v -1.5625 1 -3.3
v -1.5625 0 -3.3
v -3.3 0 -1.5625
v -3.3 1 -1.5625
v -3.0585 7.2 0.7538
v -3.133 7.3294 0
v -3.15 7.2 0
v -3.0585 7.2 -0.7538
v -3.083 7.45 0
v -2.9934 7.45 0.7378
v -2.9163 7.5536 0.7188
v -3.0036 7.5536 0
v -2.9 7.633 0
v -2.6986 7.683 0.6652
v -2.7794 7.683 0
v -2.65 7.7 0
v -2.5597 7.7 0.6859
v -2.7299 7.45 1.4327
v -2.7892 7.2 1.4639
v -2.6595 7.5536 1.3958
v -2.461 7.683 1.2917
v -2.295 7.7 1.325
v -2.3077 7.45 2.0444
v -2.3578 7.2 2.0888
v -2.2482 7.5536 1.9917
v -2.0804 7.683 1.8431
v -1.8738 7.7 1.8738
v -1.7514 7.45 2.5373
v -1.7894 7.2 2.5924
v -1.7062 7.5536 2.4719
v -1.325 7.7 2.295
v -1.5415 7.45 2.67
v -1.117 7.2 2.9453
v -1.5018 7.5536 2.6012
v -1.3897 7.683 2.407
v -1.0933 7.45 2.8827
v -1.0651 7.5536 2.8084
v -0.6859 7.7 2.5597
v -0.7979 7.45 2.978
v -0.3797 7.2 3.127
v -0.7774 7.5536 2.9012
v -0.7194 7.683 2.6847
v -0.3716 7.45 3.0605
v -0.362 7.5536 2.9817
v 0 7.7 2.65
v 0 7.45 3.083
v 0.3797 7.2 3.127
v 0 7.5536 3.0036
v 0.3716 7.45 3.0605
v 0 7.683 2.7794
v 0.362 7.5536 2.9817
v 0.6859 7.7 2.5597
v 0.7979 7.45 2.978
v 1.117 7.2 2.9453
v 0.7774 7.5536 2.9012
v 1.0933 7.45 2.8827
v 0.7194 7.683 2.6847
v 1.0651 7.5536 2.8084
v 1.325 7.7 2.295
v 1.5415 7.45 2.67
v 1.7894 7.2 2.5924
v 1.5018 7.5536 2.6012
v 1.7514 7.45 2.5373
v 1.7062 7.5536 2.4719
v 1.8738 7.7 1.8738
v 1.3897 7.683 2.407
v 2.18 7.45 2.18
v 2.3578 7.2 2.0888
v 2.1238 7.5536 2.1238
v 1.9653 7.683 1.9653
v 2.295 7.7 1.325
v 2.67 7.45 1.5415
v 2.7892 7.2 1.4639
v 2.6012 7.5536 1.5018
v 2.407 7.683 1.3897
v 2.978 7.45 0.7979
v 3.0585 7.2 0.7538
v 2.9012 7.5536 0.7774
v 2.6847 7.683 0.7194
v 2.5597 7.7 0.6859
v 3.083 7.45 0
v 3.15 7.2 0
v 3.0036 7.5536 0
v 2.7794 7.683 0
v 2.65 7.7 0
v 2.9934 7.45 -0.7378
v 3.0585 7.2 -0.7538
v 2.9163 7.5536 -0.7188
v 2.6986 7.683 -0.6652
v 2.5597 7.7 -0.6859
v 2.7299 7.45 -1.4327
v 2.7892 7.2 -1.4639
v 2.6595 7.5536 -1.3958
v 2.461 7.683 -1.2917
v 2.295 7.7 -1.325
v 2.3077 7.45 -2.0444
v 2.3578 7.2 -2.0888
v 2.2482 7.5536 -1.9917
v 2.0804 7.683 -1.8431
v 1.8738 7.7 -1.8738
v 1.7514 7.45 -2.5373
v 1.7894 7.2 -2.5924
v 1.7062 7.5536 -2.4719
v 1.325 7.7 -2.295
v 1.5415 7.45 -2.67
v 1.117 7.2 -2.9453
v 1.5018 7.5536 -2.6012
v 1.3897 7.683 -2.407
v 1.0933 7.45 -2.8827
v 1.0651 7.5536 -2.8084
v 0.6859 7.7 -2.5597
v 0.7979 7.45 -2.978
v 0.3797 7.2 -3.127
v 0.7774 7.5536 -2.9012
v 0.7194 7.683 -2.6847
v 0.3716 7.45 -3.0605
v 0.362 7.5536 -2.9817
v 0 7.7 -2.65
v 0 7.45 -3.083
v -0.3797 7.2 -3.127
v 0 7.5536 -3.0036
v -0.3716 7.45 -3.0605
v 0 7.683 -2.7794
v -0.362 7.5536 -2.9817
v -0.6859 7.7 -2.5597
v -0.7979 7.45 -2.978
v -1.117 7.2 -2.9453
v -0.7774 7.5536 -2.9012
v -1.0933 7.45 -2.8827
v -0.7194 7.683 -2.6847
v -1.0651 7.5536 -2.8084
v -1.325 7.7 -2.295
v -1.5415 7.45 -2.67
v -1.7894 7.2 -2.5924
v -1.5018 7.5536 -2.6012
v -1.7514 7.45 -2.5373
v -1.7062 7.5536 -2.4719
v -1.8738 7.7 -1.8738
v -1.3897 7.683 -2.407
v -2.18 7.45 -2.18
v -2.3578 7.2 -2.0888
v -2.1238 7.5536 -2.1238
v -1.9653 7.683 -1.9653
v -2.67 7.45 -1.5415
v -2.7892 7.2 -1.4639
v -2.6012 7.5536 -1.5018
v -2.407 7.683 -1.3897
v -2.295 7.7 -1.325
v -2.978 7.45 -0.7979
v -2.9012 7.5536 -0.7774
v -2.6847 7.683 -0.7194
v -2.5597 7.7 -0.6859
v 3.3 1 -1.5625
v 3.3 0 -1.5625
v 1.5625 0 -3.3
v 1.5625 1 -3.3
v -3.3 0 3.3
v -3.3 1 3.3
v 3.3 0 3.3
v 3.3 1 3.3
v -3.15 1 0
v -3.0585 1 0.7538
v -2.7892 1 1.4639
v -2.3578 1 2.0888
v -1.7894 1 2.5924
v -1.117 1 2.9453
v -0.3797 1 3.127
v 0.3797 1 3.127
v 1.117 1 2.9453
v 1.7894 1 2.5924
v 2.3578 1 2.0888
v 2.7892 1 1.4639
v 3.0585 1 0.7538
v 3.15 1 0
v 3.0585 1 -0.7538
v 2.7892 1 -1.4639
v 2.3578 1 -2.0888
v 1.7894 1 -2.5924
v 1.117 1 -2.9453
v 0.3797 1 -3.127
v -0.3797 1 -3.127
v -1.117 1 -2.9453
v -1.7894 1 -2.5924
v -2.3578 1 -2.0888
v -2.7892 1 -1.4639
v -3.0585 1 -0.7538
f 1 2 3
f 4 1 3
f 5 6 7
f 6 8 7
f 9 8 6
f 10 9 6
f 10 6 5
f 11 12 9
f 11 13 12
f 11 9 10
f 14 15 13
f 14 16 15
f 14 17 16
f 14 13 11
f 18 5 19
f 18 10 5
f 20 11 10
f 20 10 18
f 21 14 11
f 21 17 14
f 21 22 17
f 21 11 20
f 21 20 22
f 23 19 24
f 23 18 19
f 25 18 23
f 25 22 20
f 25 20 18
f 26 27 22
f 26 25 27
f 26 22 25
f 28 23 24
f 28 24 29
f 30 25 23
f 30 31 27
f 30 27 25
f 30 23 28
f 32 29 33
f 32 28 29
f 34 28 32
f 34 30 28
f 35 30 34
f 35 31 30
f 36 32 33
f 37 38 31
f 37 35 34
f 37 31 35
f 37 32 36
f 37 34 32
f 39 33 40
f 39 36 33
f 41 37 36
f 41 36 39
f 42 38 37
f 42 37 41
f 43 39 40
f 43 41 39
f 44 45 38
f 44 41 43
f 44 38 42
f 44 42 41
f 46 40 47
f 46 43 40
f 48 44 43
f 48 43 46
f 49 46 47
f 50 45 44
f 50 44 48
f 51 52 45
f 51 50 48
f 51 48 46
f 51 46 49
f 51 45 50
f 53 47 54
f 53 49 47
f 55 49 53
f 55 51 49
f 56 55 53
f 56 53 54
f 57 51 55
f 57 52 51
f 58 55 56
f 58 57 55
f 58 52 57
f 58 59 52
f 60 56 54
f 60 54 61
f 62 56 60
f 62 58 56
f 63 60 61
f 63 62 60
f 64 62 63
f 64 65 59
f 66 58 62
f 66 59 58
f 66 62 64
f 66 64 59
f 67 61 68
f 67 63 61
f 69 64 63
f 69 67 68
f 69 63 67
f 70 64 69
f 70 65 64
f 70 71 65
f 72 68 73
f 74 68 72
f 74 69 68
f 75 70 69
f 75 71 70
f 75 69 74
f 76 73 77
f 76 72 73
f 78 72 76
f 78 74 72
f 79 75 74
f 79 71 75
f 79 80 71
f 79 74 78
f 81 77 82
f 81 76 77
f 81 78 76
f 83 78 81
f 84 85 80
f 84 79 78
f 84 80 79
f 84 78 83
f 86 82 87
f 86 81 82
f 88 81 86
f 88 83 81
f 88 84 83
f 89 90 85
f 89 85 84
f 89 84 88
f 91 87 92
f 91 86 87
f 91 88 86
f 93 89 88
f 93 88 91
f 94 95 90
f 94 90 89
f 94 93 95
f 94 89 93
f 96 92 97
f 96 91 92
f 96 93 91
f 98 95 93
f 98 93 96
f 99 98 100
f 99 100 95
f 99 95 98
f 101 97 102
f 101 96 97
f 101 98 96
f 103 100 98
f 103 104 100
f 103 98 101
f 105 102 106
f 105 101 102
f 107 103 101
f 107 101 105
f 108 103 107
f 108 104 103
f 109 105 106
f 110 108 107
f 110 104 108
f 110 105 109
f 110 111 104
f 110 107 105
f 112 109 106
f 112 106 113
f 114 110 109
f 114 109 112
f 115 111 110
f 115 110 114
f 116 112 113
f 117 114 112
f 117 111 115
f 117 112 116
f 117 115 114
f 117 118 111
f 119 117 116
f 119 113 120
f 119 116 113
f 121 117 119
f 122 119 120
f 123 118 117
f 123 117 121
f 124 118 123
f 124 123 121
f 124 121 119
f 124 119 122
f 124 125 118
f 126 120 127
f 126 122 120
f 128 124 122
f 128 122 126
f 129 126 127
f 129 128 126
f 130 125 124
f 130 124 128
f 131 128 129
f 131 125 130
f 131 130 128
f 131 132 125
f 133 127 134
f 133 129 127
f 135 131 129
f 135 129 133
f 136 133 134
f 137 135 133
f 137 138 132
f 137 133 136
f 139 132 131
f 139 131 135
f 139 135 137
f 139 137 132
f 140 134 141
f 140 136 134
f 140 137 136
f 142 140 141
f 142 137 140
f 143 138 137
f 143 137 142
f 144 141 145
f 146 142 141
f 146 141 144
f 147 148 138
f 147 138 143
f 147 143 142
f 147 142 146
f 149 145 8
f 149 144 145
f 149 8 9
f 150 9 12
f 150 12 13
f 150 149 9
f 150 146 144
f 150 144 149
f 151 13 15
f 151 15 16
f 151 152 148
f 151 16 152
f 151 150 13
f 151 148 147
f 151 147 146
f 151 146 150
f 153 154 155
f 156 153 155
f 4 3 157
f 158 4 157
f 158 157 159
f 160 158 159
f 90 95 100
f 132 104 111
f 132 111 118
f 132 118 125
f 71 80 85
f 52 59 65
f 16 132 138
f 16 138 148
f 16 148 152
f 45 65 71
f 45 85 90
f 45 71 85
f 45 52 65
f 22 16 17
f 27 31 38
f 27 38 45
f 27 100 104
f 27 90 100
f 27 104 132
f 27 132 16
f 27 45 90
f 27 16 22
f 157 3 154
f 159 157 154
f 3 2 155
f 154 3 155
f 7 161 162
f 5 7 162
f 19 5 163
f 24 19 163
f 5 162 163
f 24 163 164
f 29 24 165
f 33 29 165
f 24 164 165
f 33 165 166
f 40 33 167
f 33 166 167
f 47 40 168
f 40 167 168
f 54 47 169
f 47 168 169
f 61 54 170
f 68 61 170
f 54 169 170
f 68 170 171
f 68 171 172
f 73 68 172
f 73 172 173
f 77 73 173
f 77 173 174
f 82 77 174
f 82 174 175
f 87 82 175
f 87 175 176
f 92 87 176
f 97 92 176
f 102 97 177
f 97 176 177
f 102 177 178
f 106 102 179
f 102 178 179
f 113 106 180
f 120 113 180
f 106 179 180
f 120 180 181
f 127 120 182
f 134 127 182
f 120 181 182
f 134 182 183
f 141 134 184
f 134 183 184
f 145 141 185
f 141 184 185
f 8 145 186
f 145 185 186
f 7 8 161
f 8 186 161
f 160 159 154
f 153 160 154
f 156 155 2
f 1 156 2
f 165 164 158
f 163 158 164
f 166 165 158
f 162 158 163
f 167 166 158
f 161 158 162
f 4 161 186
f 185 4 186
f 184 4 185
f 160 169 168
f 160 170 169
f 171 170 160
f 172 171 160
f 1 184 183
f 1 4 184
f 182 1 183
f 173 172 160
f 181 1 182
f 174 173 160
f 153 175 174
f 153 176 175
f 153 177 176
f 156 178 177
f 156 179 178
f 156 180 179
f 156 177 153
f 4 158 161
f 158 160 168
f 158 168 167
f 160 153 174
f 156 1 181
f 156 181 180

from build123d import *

# Parameters (mm, degrees)
BOSS_EXTRUDE1_DEPTH = 1
SKETCH2_R           = 3.15
BOSS_EXTRUDE2_DEPTH = 6.7
FILLET1_R           = 0.5


with BuildPart() as part:
    # Sketch1 → Boss-Extrude1 (new body)
    with BuildSketch(Plane(origin=(0, 0, 0), x_dir=(1, 0, 0), z_dir=(0, 1, 0))):
        Polygon((-1.562548269, 3.3), (-3.3, 1.562548269), (-3.3, -3.3), (3.3, -3.3), (3.3, 1.562548269), (1.562548269, 3.3), align=None)
    extrude(amount=BOSS_EXTRUDE1_DEPTH)

    # Sketch2 → Boss-Extrude2 (add)
    with BuildSketch(Plane(origin=(0, 1, 0), x_dir=(-1, 0, 0), z_dir=(0, 1, 0))):
        Circle(SKETCH2_R)
    extrude(amount=BOSS_EXTRUDE2_DEPTH)

    # Fillet1
    fillet1_edges = [part.edges().sort_by_distance(p)[0] for p in [
        (3.15, 7.7, 0),
    ]]
    fillet(fillet1_edges, radius=FILLET1_R)


solid = part.part
